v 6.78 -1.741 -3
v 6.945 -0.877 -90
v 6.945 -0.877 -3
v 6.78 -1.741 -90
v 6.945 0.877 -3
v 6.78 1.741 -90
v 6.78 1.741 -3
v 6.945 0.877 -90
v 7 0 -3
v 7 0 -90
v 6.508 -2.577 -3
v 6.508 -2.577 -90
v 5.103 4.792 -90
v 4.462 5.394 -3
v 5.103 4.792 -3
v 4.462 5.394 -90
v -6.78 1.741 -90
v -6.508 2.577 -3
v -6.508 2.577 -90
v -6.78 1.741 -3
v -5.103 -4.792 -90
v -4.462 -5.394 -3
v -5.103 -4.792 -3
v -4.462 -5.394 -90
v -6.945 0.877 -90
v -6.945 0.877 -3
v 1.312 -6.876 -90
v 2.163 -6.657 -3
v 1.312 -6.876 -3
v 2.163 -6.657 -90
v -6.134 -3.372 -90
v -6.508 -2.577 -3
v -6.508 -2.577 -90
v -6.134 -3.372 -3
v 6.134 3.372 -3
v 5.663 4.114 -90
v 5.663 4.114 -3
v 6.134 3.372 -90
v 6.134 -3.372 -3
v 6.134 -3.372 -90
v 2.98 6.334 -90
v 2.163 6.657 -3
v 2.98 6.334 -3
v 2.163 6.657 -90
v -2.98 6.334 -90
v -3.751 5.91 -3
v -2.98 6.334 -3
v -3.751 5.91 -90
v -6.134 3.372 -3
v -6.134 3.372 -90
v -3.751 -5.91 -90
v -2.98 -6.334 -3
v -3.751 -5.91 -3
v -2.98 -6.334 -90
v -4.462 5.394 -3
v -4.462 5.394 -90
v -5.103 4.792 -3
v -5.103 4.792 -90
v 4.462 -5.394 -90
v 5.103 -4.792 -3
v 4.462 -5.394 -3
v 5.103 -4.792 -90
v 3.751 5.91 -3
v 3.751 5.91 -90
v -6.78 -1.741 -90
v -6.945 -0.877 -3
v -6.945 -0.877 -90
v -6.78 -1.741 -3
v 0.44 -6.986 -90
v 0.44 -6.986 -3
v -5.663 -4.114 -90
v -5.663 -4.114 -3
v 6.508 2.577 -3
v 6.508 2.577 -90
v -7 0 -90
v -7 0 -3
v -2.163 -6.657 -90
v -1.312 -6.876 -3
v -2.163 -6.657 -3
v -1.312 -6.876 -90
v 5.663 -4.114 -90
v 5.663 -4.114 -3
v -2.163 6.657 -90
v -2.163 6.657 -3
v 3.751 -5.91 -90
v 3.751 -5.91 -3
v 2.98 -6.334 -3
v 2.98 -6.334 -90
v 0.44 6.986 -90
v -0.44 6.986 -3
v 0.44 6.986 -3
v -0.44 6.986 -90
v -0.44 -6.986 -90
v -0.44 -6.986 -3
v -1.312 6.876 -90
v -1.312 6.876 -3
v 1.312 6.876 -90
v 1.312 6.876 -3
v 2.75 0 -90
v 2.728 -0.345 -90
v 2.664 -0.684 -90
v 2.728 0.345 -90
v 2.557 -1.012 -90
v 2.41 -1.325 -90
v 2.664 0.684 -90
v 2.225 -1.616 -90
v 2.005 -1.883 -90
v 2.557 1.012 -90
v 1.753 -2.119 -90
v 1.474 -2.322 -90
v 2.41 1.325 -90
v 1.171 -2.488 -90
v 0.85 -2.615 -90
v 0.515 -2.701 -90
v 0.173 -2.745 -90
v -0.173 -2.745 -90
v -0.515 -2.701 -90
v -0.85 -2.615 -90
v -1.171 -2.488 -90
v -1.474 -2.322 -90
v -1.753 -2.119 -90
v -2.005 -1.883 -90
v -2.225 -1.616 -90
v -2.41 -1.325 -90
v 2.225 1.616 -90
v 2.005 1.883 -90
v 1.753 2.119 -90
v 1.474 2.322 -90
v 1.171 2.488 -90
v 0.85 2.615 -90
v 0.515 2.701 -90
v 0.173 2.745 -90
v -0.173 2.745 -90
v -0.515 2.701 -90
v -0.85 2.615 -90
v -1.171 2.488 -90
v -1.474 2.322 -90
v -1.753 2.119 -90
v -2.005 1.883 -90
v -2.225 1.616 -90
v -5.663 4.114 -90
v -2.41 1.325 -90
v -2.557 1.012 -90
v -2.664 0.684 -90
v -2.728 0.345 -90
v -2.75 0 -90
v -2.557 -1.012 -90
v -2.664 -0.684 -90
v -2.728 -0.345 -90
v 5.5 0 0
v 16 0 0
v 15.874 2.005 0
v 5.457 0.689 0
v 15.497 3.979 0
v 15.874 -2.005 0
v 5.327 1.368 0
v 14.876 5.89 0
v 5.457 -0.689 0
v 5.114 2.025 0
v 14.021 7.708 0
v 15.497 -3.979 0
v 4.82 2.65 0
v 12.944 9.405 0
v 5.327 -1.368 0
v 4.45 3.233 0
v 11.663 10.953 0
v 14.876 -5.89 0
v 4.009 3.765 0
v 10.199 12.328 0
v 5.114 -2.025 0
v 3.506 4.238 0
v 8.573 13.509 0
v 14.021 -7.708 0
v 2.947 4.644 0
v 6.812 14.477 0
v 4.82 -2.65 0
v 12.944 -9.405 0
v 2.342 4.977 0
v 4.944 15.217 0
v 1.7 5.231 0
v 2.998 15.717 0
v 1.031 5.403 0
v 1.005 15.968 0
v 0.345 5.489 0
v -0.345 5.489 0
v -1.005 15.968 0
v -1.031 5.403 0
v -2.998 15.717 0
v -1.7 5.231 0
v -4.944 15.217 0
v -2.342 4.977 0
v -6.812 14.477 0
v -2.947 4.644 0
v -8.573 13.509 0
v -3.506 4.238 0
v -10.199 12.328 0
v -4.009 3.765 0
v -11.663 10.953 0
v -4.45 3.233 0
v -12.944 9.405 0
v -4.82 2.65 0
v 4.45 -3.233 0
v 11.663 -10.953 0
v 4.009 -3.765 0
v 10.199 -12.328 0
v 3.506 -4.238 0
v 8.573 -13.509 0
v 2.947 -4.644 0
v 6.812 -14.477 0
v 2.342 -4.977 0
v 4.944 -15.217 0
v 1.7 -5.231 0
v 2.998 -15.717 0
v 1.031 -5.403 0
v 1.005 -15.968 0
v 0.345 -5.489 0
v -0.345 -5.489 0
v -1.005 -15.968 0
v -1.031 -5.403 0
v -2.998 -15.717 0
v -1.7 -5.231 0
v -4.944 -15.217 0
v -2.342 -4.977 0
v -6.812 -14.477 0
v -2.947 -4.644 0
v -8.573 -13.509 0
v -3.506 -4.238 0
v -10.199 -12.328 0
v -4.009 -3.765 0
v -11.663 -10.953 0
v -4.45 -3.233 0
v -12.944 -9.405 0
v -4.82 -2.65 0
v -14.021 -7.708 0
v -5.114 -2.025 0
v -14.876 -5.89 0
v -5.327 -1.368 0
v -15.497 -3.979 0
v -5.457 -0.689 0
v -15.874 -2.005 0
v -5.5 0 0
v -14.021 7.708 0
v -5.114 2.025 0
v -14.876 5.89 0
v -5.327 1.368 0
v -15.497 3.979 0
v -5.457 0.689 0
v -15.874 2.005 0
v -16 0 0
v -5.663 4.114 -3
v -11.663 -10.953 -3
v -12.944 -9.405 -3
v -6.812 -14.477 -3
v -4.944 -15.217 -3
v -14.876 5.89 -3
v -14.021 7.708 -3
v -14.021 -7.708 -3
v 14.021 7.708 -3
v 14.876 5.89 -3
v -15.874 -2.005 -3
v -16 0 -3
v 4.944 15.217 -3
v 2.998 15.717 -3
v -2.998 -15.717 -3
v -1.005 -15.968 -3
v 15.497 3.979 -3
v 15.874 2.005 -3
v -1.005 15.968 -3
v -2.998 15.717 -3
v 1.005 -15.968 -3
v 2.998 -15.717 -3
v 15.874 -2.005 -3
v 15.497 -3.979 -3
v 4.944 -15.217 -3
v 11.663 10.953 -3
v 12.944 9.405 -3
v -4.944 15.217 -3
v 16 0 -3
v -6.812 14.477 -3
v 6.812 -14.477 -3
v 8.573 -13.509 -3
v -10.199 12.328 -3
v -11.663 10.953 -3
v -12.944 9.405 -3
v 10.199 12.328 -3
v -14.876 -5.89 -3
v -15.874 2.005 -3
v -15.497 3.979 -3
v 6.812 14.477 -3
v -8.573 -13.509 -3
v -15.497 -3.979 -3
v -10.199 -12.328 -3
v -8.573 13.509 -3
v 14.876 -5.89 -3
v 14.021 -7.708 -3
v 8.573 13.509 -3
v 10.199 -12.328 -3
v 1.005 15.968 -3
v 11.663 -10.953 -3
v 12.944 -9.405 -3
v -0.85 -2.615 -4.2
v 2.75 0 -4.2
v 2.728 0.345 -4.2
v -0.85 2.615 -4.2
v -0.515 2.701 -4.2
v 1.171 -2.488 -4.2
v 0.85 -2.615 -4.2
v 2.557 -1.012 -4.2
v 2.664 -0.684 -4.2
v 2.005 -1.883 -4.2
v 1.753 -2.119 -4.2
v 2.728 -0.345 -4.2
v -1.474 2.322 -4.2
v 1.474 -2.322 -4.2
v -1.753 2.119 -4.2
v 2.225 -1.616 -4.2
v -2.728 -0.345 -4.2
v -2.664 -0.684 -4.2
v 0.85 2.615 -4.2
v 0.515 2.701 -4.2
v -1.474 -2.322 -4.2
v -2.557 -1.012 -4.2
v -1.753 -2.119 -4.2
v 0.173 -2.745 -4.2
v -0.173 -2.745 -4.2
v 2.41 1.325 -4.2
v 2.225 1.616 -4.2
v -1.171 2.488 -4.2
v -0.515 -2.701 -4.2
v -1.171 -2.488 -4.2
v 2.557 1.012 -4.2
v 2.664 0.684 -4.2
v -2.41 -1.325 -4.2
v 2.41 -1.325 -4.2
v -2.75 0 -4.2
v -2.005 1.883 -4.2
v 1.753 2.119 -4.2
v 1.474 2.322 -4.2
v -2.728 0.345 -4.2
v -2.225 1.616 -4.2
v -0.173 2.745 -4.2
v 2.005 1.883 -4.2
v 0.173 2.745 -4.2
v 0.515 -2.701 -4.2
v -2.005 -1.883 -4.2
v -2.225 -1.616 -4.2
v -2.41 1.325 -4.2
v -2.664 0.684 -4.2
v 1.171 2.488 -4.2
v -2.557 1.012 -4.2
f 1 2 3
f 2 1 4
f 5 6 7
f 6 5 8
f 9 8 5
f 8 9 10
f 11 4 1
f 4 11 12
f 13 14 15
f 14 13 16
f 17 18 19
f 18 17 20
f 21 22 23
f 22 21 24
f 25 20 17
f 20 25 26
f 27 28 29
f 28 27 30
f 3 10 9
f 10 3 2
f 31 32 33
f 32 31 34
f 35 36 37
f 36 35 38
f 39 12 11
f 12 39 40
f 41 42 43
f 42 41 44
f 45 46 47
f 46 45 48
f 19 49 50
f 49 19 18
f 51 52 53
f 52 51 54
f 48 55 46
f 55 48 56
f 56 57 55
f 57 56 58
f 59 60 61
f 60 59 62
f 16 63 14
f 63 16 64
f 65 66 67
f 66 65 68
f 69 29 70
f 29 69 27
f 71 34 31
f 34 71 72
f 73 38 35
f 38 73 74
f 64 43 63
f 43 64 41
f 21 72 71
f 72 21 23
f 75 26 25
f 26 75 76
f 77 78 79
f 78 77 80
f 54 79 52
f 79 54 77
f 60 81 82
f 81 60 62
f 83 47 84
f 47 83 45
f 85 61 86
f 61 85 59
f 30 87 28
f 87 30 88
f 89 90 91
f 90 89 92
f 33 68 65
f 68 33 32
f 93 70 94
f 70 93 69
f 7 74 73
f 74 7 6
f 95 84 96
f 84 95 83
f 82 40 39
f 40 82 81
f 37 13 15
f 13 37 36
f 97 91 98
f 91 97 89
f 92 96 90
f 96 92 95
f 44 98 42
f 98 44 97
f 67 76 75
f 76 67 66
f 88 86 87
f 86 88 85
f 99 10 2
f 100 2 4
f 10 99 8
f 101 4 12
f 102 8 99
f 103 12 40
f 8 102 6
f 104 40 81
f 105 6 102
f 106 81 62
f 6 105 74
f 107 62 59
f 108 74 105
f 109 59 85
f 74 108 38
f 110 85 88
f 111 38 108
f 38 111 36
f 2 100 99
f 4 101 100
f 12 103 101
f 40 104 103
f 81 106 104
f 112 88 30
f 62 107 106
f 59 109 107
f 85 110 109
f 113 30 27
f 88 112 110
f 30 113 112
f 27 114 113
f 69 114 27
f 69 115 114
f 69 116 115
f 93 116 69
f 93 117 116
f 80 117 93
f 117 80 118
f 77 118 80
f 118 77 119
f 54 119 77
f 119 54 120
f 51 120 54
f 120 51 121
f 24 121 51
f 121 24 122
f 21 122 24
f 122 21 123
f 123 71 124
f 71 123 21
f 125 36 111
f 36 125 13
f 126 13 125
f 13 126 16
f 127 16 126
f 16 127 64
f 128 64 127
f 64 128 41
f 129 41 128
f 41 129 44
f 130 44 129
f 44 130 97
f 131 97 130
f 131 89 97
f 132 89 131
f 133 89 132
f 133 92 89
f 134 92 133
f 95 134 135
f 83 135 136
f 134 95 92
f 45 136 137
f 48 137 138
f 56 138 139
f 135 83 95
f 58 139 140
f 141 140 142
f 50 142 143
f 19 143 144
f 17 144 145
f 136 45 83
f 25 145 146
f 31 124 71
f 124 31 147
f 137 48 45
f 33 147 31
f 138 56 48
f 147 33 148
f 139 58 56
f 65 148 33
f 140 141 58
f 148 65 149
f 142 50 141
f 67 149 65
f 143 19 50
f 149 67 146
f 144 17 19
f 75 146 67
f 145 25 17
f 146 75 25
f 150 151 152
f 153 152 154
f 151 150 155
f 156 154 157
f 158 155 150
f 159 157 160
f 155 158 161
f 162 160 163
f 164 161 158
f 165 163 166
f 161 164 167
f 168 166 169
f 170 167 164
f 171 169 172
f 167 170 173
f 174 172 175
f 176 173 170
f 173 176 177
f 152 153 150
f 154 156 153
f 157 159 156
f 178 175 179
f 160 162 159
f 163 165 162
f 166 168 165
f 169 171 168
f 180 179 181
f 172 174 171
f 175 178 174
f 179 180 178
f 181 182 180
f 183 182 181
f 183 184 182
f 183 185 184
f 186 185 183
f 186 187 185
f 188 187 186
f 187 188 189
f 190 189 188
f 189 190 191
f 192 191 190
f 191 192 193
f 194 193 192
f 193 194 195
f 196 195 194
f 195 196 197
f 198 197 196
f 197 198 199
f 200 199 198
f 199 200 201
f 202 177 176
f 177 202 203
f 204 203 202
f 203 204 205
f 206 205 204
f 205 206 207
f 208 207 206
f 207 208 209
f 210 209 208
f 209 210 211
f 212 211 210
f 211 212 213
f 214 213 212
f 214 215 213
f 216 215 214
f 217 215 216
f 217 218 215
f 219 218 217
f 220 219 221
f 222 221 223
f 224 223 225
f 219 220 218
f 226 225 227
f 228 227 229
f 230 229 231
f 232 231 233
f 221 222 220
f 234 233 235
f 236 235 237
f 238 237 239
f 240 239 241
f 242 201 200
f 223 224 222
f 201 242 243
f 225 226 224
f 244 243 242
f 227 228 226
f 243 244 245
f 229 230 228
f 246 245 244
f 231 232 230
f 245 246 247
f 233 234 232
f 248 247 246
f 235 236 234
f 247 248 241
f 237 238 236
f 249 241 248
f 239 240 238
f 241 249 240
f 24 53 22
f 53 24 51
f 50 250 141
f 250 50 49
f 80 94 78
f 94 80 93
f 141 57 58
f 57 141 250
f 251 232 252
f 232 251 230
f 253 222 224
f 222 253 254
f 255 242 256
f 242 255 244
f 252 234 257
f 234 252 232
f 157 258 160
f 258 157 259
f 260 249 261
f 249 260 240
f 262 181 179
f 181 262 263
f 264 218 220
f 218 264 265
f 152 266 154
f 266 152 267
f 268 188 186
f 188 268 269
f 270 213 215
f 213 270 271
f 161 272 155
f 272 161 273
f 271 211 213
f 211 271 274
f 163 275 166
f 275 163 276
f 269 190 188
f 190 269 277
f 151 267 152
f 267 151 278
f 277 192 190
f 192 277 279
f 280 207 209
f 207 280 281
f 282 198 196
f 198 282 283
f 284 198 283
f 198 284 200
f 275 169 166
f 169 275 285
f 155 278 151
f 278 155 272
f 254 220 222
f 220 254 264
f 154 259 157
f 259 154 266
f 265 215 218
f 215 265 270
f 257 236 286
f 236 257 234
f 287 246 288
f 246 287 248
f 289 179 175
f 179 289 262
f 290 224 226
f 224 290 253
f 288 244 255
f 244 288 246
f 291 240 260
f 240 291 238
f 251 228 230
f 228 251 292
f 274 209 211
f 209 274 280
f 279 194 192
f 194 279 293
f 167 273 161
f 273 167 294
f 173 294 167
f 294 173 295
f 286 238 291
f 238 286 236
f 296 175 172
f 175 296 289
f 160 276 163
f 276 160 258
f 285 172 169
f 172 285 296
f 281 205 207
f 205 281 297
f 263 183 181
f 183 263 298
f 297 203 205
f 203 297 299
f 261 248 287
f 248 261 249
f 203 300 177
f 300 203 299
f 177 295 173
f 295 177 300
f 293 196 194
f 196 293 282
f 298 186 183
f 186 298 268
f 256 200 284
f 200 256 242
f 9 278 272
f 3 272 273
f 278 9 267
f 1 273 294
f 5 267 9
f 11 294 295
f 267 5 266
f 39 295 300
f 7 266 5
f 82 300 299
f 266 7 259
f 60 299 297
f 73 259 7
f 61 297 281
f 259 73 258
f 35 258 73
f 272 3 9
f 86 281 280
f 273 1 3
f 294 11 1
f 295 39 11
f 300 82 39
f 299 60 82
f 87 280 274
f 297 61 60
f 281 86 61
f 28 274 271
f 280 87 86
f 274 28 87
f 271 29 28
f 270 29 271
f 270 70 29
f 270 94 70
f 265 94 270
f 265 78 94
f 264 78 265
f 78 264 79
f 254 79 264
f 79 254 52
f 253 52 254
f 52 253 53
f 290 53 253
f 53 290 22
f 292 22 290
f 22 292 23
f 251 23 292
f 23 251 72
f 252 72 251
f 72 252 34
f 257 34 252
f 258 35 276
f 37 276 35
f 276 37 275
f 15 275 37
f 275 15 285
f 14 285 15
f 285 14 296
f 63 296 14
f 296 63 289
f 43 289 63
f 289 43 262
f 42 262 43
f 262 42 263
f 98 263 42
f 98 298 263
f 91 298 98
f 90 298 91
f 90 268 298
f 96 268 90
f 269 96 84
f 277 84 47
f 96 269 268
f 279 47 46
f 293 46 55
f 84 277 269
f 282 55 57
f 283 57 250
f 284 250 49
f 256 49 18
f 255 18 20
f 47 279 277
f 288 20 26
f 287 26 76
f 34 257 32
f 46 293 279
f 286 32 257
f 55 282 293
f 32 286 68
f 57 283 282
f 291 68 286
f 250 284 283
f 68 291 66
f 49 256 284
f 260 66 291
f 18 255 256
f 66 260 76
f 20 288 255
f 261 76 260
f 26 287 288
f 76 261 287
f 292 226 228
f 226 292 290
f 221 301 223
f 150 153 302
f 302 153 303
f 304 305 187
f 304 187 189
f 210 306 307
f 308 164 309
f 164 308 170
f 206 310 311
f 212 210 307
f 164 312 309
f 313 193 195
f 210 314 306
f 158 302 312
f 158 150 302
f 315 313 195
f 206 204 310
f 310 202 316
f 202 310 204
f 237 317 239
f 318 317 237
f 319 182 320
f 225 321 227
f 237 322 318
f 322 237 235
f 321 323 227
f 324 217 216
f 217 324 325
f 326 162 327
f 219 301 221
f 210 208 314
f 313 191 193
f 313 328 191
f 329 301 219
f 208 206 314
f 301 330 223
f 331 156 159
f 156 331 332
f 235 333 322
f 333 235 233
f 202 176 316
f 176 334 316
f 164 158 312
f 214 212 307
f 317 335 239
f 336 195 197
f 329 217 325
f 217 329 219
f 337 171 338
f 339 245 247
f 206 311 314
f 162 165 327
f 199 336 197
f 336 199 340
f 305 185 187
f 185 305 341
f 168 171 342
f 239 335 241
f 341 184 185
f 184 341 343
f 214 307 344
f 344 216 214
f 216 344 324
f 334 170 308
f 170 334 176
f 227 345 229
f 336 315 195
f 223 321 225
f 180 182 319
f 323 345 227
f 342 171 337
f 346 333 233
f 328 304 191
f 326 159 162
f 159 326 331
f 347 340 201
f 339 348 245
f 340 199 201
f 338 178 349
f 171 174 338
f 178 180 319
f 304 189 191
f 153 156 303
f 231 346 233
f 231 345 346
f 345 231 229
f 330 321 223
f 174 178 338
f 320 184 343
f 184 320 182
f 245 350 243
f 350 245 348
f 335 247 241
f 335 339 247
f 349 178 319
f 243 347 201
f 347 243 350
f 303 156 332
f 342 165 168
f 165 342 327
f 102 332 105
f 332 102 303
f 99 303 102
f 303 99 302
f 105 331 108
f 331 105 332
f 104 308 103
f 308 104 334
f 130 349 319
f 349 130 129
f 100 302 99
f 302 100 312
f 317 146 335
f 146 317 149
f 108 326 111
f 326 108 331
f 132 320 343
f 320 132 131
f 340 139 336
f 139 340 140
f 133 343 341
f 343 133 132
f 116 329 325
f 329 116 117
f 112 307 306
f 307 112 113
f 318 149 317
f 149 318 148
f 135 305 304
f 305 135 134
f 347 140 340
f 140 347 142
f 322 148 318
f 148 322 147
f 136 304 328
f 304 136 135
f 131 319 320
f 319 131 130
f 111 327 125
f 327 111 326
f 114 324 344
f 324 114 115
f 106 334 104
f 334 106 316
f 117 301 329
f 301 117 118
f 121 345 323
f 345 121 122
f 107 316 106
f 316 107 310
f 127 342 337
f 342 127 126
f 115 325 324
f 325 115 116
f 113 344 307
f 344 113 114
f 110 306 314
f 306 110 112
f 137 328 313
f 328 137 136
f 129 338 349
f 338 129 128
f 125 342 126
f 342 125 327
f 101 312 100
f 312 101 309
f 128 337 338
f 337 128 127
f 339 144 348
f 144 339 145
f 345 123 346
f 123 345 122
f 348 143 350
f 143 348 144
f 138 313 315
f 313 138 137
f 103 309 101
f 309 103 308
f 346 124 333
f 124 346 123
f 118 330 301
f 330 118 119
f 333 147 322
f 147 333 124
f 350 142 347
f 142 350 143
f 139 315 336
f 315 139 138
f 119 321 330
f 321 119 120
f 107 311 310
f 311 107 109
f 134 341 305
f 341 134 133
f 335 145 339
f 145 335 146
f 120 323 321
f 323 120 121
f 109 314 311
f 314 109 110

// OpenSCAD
$fn = 50;


difference() {
	union() {
		translate(v = [0, 0, -90.0000000000]) {
			cylinder(h = 90, r = 7.0000000000);
		}
		translate(v = [0, 0, -3.0000000000]) {
			cylinder(h = 3, r = 16.0000000000);
		}
	}
	union() {
		translate(v = [0, 0, 0]) {
			rotate(a = [0, 0, 0]) {
				difference() {
					union() {
						#translate(v = [0, 0, -90.0000000000]) {
							cylinder(h = 90, r = 2.2500000000);
						}
						#translate(v = [0, 0, -4.2000000000]) {
							cylinder(h = 4.2000000000, r1 = 2.7500000000, r2 = 5.5000000000);
						}
						#translate(v = [0, 0, -90.0000000000]) {
							cylinder(h = 90, r = 2.7500000000);
						}
						#translate(v = [0, 0, -90.0000000000]) {
							cylinder(h = 90, r = 2.2500000000);
						}
					}
					union();
				}
			}
		}
	}
}
